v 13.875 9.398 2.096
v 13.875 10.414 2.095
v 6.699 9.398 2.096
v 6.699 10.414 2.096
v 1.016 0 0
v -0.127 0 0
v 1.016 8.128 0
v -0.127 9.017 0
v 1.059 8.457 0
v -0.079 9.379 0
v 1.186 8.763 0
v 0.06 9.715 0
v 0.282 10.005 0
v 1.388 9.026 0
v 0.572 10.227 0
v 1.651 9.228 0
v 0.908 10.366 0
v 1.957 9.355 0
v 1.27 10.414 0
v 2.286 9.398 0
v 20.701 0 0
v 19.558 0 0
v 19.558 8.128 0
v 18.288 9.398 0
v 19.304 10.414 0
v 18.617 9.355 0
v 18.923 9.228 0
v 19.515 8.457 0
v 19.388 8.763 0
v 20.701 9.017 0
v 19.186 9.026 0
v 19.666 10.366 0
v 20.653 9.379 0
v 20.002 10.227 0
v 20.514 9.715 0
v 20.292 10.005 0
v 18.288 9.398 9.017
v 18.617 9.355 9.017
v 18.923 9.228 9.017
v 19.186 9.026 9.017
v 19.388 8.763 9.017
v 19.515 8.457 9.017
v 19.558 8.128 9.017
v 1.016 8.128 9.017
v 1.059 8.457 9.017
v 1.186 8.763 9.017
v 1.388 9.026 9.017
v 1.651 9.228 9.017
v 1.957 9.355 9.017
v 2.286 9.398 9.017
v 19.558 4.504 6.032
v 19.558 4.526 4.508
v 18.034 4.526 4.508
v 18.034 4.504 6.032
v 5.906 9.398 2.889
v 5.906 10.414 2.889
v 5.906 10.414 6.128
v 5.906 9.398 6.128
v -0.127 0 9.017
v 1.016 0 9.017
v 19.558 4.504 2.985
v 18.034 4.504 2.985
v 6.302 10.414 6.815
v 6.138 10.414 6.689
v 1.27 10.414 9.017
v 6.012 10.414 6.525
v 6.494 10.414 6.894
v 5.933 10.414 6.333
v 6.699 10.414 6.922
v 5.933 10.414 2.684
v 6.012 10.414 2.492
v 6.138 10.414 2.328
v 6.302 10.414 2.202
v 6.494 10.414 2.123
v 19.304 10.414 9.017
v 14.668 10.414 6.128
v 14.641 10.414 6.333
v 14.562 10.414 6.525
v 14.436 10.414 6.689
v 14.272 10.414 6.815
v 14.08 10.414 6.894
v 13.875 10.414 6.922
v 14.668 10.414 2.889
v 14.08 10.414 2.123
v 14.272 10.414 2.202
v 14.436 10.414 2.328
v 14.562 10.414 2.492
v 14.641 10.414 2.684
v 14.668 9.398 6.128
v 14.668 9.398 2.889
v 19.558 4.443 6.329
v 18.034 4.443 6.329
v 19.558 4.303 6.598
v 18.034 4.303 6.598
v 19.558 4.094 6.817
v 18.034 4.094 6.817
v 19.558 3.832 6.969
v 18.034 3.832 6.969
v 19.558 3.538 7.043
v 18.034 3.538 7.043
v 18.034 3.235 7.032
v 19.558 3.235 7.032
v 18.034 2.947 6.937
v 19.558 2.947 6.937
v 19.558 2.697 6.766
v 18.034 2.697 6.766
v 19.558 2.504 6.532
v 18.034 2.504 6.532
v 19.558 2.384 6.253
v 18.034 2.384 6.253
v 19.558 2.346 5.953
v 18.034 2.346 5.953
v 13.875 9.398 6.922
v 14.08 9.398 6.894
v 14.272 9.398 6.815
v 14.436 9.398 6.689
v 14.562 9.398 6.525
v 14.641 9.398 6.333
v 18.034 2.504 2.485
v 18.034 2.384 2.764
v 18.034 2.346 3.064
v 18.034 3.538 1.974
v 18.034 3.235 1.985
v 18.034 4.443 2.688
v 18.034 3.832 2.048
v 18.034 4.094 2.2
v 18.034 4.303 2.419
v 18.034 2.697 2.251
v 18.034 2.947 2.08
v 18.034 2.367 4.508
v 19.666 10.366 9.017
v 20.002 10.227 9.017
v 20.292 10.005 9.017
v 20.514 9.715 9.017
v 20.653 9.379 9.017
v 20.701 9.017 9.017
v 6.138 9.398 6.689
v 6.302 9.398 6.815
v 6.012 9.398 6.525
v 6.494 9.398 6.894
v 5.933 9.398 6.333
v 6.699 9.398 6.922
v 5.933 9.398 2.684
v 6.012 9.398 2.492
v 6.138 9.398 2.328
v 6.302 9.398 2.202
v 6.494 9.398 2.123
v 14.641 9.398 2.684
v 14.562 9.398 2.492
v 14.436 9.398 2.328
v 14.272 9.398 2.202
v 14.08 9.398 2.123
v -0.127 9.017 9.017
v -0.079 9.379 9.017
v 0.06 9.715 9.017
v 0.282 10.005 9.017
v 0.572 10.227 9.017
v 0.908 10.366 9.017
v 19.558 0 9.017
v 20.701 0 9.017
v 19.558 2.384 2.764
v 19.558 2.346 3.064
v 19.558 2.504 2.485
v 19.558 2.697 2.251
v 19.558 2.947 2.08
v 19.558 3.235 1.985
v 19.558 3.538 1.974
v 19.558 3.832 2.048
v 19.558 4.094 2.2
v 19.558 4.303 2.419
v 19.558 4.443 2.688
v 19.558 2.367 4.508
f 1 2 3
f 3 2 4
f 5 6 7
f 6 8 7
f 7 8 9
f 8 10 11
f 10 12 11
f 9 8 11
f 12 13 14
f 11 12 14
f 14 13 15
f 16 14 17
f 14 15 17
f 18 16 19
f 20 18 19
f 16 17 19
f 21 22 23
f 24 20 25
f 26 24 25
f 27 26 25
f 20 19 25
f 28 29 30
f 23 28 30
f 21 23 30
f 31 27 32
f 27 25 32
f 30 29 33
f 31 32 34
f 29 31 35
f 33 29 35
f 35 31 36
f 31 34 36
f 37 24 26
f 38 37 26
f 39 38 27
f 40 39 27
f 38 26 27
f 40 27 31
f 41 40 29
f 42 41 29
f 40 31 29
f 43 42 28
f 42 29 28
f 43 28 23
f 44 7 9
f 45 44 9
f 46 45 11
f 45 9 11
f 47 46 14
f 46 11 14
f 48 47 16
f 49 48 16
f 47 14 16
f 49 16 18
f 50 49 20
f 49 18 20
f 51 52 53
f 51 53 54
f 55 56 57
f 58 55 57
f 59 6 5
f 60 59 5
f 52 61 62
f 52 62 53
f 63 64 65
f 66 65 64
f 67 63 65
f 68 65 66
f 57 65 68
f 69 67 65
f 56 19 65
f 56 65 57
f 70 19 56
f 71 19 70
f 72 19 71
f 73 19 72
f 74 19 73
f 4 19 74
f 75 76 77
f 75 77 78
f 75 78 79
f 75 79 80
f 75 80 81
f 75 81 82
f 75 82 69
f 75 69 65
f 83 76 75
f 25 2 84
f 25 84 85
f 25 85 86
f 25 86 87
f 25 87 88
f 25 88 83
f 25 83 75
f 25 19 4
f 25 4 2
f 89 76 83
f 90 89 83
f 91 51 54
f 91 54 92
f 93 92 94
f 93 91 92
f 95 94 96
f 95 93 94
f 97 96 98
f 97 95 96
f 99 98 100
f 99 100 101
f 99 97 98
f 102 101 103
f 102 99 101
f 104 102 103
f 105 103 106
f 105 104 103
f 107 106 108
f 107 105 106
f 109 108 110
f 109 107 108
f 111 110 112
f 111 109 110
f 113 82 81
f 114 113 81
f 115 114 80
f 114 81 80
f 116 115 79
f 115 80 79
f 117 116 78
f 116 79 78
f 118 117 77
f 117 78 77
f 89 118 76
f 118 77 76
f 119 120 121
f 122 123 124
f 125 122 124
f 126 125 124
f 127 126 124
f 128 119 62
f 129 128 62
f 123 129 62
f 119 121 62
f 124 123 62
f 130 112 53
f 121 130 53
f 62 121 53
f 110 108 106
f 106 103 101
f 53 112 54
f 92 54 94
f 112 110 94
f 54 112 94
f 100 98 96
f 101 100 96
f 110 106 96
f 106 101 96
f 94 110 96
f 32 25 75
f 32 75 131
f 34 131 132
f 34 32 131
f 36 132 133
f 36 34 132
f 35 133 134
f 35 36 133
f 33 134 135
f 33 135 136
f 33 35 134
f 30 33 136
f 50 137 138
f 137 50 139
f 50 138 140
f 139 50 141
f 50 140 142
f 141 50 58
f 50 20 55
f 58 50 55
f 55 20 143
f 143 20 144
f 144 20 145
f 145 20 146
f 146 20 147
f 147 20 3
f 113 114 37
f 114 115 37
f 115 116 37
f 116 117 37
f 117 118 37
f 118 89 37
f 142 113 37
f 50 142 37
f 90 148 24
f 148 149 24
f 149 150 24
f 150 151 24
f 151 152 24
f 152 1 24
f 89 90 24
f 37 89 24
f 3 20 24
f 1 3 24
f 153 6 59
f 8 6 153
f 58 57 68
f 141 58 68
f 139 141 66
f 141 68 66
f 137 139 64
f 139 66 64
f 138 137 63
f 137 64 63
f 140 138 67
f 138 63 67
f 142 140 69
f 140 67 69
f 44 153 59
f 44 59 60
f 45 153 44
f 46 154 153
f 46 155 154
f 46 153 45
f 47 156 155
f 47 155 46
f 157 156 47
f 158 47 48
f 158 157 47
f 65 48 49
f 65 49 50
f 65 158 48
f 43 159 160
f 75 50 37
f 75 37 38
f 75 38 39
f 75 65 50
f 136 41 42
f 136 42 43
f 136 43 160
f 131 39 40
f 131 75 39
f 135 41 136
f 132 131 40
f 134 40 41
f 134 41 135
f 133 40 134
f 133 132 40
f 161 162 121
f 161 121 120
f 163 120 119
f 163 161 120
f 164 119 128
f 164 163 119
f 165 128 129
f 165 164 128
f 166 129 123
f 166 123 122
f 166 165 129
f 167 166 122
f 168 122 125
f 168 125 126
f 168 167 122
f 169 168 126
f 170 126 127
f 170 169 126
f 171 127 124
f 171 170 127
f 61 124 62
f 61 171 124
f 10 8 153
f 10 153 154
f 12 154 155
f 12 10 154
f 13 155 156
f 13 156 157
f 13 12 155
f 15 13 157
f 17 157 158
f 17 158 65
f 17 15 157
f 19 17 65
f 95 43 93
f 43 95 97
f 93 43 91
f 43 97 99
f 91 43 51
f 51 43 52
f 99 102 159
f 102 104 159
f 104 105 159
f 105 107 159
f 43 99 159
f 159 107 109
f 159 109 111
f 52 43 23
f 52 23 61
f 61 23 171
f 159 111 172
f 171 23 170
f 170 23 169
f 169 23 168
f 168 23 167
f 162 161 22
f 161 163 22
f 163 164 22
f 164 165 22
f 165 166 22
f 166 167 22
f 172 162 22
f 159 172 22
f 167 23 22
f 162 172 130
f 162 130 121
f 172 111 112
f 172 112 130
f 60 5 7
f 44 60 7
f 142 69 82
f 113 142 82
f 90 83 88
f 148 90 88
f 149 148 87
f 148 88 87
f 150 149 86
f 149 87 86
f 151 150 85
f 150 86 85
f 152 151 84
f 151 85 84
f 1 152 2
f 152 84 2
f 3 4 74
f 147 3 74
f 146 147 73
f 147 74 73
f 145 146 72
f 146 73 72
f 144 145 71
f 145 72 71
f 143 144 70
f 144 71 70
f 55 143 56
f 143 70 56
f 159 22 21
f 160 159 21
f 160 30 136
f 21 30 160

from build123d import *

# Parameters (mm, degrees)
F1_DEPTH = 9.017
F3_DEPTH = 10.288
F5_DEPTH = 2.54
F7_DEPTH = 9.017
F9_DEPTH = 25.4


with BuildPart() as f1:
    # F0 (on Top) → F1 (new body)
    with BuildSketch(Plane.XY):
        with BuildLine():
            Line((0, 9.017), (0, 0))
            Line((0, 0), (1.016, 0))
            Line((1.016, 0), (1.016, 8.128))
            ThreePointArc((1.016, 8.128), (1.387974, 9.026026), (2.286, 9.398))
            Line((2.286, 9.398), (18.288, 9.398))
            ThreePointArc((18.288, 9.398), (19.186026, 9.026026), (19.558, 8.128))
            Line((19.558, 8.128), (19.558, 0))
            Line((19.558, 0), (20.574, 0))
            Line((20.574, 0), (20.574, 9.017))
            ThreePointArc((20.574, 9.017), (20.202026, 9.915026), (19.304, 10.287))
            Line((19.304, 10.287), (1.27, 10.287))
            ThreePointArc((1.27, 10.287), (0.371974, 9.915026), (0, 9.017))
        make_face()
    extrude(amount=F1_DEPTH)

    # F2 (on face) → F3 (cut, through all)
    with BuildSketch(Plane(origin=(0, 10.287, 0), x_dir=(-1, 0, 0), z_dir=(0, 1, 0))):
        with BuildLine():
            Line((-13.87475, 2.0955), (-6.69925, 2.0955))
            ThreePointArc((-6.69925, 2.0955), (-6.137984, 2.327984), (-5.9055, 2.88925))
            Line((-5.9055, 2.88925), (-5.9055, 6.12775))
            ThreePointArc((-5.9055, 6.12775), (-6.137984, 6.689016), (-6.69925, 6.9215))
            Line((-6.69925, 6.9215), (-13.87475, 6.9215))
            ThreePointArc((-13.87475, 6.9215), (-14.436016, 6.689016), (-14.6685, 6.12775))
            Line((-14.6685, 6.12775), (-14.6685, 2.88925))
            ThreePointArc((-14.6685, 2.88925), (-14.436016, 2.327984), (-13.87475, 2.0955))
        make_face()
    extrude(amount=-F3_DEPTH, mode=Mode.SUBTRACT)

    # F4 (on face) → F5 (join)
    with BuildSketch(Plane.YZ.offset(20.574)):
        with BuildLine():
            Line((4.503683, 2.984615), (4.525844, 4.5085))
            Line((4.525844, 4.5085), (4.503683, 6.032385))
            ThreePointArc((4.503683, 6.032385), (3.385713, 7.047766), (2.345612, 5.952756))
            Line((2.345612, 5.952756), (2.366616, 4.5085))
            Line((2.366616, 4.5085), (2.345612, 3.064244))
            ThreePointArc((2.345612, 3.064244), (3.385713, 1.969234), (4.503683, 2.984615))
        make_face()
    extrude(amount=-F5_DEPTH)

    # F6 (on face) → F7 (join, through all)
    with BuildSketch(Plane(origin=(0, 0, 0), x_dir=(1, 0, 0), z_dir=(0, 0, -1))):
        with BuildLine():
            Line((20.574, 0), (20.574, -9.017))
            ThreePointArc((20.574, -9.017), (20.202026, -9.915026), (19.304, -10.287))
            Line((19.304, -10.287), (1.27, -10.287))
            ThreePointArc((1.27, -10.287), (0.371974, -9.915026), (0, -9.017))
            Line((0, -9.017), (0, 0))
            Line((0, 0), (-0.127, 0))
            Line((-0.127, 0), (-0.127, -9.017))
            ThreePointArc((-0.127, -9.017), (0.282172, -10.004828), (1.27, -10.414))
            Line((1.27, -10.414), (19.304, -10.414))
            ThreePointArc((19.304, -10.414), (20.291828, -10.004828), (20.701, -9.017))
            Line((20.701, -9.017), (20.701, 0))
            Line((20.701, 0), (20.574, 0))
        make_face()
    extrude(amount=-F7_DEPTH)

    # F8 (on face) → F9 (cut)
    with BuildSketch(Plane.XZ.offset(-10.287)):
        with BuildLine():
            ThreePointArc((5.9055, 2.88925), (6.137984, 2.327984), (6.69925, 2.0955))
            Line((6.69925, 2.0955), (13.87475, 2.0955))
            ThreePointArc((13.87475, 2.0955), (14.436016, 2.327984), (14.6685, 2.88925))
            Line((14.6685, 2.88925), (14.6685, 6.12775))
            ThreePointArc((14.6685, 6.12775), (14.436016, 6.689016), (13.87475, 6.9215))
            Line((13.87475, 6.9215), (6.69925, 6.9215))
            ThreePointArc((6.69925, 6.9215), (6.137984, 6.689016), (5.9055, 6.12775))
            Line((5.9055, 6.12775), (5.9055, 2.88925))
        make_face()
    extrude(amount=-F9_DEPTH, mode=Mode.SUBTRACT)


solid = f1.part
